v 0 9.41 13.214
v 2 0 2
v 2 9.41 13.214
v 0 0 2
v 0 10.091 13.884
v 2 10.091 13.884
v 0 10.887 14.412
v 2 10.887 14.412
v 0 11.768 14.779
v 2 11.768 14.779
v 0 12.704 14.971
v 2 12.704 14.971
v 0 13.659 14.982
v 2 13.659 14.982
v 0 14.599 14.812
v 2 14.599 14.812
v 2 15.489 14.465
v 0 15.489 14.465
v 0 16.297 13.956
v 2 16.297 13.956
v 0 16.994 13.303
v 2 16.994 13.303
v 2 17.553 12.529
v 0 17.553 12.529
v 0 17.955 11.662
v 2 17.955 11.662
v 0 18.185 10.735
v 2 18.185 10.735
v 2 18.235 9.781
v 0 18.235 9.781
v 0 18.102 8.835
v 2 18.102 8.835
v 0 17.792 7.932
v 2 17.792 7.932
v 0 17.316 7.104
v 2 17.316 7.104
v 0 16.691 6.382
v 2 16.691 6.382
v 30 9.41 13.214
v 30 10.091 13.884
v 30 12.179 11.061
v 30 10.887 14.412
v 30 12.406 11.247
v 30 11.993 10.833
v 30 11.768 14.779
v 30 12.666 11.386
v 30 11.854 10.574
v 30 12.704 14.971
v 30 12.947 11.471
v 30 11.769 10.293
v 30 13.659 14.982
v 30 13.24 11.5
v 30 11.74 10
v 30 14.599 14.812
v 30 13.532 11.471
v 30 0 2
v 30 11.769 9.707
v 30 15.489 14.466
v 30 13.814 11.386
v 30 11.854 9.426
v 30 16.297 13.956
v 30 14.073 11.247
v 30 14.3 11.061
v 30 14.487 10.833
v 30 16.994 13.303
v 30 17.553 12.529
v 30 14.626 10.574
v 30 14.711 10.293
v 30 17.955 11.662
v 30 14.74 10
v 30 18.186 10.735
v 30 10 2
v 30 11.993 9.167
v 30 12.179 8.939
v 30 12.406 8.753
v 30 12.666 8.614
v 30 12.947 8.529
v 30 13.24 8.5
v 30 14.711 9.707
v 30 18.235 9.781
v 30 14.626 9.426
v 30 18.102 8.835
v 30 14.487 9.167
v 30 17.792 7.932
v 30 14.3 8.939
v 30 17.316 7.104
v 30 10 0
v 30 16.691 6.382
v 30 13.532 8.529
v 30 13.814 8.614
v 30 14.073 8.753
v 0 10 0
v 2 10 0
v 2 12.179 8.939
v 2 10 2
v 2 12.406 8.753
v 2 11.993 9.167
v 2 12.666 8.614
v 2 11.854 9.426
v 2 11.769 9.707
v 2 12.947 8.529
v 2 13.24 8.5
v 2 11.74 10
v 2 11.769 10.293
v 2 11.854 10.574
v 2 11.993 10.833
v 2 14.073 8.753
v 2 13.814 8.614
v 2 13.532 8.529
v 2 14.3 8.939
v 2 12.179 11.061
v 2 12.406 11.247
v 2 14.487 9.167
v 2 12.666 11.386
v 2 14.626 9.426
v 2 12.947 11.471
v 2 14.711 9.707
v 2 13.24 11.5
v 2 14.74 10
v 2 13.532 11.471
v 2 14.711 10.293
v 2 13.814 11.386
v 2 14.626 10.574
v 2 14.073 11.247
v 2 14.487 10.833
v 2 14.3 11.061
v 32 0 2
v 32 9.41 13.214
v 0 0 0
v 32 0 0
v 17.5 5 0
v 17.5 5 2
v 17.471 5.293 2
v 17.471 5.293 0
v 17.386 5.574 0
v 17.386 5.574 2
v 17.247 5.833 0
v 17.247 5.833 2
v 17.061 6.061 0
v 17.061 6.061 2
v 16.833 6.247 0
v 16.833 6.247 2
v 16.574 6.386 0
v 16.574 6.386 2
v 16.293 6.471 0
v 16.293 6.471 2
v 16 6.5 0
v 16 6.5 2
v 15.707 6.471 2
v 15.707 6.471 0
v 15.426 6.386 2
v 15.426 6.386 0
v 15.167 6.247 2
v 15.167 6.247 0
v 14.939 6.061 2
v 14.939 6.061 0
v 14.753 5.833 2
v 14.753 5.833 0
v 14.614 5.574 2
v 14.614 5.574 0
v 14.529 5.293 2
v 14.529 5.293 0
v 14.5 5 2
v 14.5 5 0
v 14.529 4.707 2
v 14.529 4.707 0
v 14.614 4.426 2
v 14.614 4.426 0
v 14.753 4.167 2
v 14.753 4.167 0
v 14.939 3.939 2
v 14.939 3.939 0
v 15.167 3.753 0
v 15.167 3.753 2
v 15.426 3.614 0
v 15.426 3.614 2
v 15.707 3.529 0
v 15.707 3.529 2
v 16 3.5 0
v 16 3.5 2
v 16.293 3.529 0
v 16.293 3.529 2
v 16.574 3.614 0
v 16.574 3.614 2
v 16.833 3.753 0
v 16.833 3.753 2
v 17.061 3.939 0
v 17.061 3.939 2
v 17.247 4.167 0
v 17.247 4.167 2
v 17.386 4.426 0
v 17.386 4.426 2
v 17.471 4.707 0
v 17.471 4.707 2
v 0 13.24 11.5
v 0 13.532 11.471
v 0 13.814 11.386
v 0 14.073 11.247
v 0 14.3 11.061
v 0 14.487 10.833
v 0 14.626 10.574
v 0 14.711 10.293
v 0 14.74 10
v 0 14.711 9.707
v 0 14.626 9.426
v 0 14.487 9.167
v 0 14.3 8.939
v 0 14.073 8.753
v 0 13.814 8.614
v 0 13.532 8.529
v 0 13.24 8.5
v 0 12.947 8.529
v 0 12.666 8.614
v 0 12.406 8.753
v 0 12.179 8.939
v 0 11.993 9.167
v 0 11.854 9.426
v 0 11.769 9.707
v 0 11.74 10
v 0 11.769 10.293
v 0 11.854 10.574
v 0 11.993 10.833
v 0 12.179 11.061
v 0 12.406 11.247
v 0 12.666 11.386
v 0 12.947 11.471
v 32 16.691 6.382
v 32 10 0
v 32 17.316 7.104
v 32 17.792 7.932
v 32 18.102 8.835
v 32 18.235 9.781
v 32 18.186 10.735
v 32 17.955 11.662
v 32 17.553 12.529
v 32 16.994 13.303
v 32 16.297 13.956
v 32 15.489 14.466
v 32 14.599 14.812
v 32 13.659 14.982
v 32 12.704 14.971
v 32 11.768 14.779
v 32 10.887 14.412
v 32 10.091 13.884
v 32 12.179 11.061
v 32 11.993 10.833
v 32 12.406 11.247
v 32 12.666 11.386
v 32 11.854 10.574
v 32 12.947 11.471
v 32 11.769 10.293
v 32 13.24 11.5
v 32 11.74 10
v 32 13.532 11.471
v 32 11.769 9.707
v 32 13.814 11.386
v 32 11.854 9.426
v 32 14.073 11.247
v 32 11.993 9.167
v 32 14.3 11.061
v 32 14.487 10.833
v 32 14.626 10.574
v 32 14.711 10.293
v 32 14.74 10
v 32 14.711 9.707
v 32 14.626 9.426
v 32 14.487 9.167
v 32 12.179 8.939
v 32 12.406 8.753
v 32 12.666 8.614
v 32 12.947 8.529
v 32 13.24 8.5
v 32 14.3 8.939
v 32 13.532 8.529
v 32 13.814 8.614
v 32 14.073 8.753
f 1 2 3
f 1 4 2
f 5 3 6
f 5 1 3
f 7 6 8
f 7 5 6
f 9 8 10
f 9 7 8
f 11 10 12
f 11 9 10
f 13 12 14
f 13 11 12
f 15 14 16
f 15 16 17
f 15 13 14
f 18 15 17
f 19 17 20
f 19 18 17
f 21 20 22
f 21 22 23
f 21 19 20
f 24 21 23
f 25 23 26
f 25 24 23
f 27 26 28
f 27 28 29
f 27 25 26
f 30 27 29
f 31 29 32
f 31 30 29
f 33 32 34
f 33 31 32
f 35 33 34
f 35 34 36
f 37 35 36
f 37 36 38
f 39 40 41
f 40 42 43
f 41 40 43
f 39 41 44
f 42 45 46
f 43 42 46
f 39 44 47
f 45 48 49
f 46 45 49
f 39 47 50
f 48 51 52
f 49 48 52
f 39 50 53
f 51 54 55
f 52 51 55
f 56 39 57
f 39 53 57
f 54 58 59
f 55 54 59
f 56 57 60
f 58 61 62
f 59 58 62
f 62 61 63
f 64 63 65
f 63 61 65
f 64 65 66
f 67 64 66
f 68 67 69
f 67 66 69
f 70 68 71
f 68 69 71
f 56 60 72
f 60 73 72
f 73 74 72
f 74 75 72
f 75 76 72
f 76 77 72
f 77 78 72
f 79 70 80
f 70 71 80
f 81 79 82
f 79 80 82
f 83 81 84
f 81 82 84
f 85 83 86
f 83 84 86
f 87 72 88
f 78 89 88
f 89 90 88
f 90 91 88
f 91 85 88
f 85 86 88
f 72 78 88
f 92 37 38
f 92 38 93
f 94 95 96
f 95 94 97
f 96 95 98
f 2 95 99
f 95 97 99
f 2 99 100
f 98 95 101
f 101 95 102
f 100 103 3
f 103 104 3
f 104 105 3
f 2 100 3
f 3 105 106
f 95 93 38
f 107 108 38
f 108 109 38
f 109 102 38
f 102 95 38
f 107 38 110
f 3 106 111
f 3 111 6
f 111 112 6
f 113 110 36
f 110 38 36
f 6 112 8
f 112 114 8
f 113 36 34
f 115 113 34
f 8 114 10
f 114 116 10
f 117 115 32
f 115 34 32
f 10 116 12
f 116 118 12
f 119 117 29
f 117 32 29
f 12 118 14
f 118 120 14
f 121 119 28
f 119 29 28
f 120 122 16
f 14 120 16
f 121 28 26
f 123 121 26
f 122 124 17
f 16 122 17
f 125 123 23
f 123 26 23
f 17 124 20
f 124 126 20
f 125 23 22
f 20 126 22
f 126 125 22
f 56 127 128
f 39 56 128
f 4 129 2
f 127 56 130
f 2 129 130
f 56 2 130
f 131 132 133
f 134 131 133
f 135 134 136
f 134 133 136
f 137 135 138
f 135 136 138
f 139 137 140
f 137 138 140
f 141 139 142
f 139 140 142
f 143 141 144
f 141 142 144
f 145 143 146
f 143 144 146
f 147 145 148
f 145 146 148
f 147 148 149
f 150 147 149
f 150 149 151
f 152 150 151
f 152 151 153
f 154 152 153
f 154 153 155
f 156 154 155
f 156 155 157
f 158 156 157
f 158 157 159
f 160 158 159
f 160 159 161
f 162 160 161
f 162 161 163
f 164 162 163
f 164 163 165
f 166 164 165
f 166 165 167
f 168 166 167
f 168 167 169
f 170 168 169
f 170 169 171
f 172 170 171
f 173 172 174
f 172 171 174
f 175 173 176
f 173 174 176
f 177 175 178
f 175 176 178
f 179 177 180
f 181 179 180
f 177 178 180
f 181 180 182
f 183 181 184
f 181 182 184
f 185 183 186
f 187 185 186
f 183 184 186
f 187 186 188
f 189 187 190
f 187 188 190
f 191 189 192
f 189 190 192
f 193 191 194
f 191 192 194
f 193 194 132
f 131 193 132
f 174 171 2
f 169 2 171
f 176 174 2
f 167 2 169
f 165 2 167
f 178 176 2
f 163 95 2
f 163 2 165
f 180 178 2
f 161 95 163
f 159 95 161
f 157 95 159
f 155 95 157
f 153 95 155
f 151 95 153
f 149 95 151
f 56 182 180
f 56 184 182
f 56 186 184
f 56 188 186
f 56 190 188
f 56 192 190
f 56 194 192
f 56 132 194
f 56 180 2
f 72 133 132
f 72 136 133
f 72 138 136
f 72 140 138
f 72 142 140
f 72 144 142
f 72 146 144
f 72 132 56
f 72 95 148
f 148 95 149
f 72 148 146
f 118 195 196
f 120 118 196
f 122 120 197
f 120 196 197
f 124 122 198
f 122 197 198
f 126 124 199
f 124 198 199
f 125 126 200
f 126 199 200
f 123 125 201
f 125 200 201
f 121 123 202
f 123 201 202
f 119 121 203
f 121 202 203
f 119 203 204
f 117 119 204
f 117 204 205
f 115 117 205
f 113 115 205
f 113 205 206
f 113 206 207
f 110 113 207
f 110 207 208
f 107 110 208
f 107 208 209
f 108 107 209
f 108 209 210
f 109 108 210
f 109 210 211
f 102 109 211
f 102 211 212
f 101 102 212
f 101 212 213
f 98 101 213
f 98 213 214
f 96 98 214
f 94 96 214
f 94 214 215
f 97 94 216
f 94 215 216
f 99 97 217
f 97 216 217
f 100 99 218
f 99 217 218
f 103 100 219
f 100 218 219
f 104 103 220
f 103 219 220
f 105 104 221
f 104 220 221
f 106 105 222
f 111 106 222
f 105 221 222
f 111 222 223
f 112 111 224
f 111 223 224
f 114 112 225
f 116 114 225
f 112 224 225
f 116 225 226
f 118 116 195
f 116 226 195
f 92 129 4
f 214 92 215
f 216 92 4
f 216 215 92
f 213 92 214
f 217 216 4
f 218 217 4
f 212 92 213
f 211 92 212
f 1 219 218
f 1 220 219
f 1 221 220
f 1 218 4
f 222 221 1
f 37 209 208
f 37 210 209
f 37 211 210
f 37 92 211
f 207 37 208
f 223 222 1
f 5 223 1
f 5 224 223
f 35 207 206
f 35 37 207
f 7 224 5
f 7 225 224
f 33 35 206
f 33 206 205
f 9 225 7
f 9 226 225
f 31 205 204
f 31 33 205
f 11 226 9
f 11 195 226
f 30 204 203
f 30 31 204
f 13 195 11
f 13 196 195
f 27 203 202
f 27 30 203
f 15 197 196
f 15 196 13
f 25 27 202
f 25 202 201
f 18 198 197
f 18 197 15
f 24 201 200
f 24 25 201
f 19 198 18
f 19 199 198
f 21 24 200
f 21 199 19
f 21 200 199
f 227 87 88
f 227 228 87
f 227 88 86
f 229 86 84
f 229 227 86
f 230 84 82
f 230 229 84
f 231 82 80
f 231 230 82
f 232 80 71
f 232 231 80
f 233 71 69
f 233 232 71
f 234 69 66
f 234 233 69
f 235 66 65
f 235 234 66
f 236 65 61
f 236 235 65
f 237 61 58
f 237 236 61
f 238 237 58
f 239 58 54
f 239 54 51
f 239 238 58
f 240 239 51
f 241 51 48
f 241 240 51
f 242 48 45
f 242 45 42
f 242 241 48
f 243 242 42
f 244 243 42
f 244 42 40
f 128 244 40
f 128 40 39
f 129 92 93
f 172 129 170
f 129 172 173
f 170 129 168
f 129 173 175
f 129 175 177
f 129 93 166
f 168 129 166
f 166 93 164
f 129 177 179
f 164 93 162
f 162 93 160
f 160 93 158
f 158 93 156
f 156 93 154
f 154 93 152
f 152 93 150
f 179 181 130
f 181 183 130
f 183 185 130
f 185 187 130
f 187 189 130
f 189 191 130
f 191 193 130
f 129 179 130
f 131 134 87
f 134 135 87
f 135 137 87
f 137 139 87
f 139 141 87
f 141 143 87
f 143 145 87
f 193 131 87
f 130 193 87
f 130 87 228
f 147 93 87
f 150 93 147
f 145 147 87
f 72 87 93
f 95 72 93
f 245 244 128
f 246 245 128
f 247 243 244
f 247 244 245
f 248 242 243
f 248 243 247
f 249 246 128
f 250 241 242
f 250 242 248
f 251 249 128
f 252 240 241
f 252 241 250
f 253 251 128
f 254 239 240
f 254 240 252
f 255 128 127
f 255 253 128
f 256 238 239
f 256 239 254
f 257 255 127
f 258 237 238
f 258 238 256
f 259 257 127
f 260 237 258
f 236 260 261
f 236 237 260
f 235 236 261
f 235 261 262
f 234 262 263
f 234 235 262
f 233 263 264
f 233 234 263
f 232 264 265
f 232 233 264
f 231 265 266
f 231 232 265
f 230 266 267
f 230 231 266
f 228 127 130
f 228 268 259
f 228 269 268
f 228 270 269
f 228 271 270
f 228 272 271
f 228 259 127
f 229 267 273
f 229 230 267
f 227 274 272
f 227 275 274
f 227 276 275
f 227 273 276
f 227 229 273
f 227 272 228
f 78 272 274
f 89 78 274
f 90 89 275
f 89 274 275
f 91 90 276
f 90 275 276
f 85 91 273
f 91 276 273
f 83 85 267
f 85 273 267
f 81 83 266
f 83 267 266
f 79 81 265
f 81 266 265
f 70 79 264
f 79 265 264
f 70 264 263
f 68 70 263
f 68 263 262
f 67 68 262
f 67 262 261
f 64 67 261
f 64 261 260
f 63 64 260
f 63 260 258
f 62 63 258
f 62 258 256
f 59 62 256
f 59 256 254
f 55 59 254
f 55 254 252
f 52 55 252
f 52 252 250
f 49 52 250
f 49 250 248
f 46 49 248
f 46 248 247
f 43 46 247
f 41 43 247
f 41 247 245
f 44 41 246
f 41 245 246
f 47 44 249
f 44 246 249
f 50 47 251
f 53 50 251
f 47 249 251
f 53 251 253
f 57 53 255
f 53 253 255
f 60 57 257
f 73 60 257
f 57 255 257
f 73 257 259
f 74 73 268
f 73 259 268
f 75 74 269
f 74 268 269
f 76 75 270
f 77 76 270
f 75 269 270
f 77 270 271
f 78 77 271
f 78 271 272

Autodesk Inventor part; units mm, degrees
ref_plane "YZ Plane" through (0, 0, 0) normal (1, 0, 0) x (0, 1, 0)
ref_plane "XZ Plane" through (0, 0, 0) normal (0, 1, 0) x (-1, 0, 0)
ref_plane "XY Plane" through (0, 0, 0) normal (0, 0, 1) x (1, 0, 0)
sketch "Sketch1" plane through (0, 0, 0) normal (0, 0, 1) x (1, 0, 0)
  line L0 (0, 0) -> (32, 0)
  line L1 (32, 0) -> (32, 10)
  line L2 (32, 10) -> (0, 10)
  line L3 (0, 10) -> (0, 0)
  dimension "d0" = 32
  dimension "d1" = 10
extrude "Extrusion1" add sketch "Sketch1" along normal blind 2
sketch "Sketch2" plane through (0, 0, 2) normal (0, 0, 1) x (1, 0, 0)
  line L0 (32, 10) -> (0, 10) projected
  line L1 (0, 10) -> (0, 0) projected
  circle A0 centre (16, 5) radius 1.5
  point P0 (16, 10)
  point P1 (0, 5)
  dimension "d4" = 3
extrude "Extrusion2" cut sketch "Sketch2" against normal through all
sketch "Sketch3" plane through (32, 0, 0) normal (1, 0, 0) x (0, 0, -1)
  circle A0 centre (-10, 13.2398) radius 5 construction
  line L0 (0, 0) -> (0, 10) projected
  line L1 (-2, 10) -> (-2, 0) projected
  line L2 (-2, 0) -> (-13.2139, 9.4096)
  line L3 (0, 10) -> (-6.3819, 16.6909)
  arc A1 (-6.3819, 16.6909) -> (-13.2139, 9.4096) centre (-10, 13.2398) ccw
  circle A2 centre (-10, 13.2398) radius 1.5
  line L4 (0, 10) -> (-2, 10) projected
  dimension "d7" = 10
  dimension "d8" = 10
  dimension "d9" = 50
  dimension "d10" = 3
extrude "Extrusion3" add sketch "Sketch3" against normal blind 2
sketch "Sketch4" plane through (0, 0, 0) normal (-1, 0, 0) x (0, 0, 1)
  circle A0 centre (10, 13.2398) radius 1.5 projected
  line L0 (6.3819, 16.6909) -> (0, 10) projected
  line L1 (2, 10) -> (0, 10) projected
  line L2 (2, 0) -> (2, 10) projected
  line L3 (2, 0) -> (13.2139, 9.4096) projected
  arc A1 (13.2139, 9.4096) -> (6.3819, 16.6909) centre (10, 13.2398) ccw projected
  point P0 (0, 0)
extrude "Extrusion4" add sketch "Sketch4" against normal blind 2
properties part number "Neck" material "ABS Plastic"
